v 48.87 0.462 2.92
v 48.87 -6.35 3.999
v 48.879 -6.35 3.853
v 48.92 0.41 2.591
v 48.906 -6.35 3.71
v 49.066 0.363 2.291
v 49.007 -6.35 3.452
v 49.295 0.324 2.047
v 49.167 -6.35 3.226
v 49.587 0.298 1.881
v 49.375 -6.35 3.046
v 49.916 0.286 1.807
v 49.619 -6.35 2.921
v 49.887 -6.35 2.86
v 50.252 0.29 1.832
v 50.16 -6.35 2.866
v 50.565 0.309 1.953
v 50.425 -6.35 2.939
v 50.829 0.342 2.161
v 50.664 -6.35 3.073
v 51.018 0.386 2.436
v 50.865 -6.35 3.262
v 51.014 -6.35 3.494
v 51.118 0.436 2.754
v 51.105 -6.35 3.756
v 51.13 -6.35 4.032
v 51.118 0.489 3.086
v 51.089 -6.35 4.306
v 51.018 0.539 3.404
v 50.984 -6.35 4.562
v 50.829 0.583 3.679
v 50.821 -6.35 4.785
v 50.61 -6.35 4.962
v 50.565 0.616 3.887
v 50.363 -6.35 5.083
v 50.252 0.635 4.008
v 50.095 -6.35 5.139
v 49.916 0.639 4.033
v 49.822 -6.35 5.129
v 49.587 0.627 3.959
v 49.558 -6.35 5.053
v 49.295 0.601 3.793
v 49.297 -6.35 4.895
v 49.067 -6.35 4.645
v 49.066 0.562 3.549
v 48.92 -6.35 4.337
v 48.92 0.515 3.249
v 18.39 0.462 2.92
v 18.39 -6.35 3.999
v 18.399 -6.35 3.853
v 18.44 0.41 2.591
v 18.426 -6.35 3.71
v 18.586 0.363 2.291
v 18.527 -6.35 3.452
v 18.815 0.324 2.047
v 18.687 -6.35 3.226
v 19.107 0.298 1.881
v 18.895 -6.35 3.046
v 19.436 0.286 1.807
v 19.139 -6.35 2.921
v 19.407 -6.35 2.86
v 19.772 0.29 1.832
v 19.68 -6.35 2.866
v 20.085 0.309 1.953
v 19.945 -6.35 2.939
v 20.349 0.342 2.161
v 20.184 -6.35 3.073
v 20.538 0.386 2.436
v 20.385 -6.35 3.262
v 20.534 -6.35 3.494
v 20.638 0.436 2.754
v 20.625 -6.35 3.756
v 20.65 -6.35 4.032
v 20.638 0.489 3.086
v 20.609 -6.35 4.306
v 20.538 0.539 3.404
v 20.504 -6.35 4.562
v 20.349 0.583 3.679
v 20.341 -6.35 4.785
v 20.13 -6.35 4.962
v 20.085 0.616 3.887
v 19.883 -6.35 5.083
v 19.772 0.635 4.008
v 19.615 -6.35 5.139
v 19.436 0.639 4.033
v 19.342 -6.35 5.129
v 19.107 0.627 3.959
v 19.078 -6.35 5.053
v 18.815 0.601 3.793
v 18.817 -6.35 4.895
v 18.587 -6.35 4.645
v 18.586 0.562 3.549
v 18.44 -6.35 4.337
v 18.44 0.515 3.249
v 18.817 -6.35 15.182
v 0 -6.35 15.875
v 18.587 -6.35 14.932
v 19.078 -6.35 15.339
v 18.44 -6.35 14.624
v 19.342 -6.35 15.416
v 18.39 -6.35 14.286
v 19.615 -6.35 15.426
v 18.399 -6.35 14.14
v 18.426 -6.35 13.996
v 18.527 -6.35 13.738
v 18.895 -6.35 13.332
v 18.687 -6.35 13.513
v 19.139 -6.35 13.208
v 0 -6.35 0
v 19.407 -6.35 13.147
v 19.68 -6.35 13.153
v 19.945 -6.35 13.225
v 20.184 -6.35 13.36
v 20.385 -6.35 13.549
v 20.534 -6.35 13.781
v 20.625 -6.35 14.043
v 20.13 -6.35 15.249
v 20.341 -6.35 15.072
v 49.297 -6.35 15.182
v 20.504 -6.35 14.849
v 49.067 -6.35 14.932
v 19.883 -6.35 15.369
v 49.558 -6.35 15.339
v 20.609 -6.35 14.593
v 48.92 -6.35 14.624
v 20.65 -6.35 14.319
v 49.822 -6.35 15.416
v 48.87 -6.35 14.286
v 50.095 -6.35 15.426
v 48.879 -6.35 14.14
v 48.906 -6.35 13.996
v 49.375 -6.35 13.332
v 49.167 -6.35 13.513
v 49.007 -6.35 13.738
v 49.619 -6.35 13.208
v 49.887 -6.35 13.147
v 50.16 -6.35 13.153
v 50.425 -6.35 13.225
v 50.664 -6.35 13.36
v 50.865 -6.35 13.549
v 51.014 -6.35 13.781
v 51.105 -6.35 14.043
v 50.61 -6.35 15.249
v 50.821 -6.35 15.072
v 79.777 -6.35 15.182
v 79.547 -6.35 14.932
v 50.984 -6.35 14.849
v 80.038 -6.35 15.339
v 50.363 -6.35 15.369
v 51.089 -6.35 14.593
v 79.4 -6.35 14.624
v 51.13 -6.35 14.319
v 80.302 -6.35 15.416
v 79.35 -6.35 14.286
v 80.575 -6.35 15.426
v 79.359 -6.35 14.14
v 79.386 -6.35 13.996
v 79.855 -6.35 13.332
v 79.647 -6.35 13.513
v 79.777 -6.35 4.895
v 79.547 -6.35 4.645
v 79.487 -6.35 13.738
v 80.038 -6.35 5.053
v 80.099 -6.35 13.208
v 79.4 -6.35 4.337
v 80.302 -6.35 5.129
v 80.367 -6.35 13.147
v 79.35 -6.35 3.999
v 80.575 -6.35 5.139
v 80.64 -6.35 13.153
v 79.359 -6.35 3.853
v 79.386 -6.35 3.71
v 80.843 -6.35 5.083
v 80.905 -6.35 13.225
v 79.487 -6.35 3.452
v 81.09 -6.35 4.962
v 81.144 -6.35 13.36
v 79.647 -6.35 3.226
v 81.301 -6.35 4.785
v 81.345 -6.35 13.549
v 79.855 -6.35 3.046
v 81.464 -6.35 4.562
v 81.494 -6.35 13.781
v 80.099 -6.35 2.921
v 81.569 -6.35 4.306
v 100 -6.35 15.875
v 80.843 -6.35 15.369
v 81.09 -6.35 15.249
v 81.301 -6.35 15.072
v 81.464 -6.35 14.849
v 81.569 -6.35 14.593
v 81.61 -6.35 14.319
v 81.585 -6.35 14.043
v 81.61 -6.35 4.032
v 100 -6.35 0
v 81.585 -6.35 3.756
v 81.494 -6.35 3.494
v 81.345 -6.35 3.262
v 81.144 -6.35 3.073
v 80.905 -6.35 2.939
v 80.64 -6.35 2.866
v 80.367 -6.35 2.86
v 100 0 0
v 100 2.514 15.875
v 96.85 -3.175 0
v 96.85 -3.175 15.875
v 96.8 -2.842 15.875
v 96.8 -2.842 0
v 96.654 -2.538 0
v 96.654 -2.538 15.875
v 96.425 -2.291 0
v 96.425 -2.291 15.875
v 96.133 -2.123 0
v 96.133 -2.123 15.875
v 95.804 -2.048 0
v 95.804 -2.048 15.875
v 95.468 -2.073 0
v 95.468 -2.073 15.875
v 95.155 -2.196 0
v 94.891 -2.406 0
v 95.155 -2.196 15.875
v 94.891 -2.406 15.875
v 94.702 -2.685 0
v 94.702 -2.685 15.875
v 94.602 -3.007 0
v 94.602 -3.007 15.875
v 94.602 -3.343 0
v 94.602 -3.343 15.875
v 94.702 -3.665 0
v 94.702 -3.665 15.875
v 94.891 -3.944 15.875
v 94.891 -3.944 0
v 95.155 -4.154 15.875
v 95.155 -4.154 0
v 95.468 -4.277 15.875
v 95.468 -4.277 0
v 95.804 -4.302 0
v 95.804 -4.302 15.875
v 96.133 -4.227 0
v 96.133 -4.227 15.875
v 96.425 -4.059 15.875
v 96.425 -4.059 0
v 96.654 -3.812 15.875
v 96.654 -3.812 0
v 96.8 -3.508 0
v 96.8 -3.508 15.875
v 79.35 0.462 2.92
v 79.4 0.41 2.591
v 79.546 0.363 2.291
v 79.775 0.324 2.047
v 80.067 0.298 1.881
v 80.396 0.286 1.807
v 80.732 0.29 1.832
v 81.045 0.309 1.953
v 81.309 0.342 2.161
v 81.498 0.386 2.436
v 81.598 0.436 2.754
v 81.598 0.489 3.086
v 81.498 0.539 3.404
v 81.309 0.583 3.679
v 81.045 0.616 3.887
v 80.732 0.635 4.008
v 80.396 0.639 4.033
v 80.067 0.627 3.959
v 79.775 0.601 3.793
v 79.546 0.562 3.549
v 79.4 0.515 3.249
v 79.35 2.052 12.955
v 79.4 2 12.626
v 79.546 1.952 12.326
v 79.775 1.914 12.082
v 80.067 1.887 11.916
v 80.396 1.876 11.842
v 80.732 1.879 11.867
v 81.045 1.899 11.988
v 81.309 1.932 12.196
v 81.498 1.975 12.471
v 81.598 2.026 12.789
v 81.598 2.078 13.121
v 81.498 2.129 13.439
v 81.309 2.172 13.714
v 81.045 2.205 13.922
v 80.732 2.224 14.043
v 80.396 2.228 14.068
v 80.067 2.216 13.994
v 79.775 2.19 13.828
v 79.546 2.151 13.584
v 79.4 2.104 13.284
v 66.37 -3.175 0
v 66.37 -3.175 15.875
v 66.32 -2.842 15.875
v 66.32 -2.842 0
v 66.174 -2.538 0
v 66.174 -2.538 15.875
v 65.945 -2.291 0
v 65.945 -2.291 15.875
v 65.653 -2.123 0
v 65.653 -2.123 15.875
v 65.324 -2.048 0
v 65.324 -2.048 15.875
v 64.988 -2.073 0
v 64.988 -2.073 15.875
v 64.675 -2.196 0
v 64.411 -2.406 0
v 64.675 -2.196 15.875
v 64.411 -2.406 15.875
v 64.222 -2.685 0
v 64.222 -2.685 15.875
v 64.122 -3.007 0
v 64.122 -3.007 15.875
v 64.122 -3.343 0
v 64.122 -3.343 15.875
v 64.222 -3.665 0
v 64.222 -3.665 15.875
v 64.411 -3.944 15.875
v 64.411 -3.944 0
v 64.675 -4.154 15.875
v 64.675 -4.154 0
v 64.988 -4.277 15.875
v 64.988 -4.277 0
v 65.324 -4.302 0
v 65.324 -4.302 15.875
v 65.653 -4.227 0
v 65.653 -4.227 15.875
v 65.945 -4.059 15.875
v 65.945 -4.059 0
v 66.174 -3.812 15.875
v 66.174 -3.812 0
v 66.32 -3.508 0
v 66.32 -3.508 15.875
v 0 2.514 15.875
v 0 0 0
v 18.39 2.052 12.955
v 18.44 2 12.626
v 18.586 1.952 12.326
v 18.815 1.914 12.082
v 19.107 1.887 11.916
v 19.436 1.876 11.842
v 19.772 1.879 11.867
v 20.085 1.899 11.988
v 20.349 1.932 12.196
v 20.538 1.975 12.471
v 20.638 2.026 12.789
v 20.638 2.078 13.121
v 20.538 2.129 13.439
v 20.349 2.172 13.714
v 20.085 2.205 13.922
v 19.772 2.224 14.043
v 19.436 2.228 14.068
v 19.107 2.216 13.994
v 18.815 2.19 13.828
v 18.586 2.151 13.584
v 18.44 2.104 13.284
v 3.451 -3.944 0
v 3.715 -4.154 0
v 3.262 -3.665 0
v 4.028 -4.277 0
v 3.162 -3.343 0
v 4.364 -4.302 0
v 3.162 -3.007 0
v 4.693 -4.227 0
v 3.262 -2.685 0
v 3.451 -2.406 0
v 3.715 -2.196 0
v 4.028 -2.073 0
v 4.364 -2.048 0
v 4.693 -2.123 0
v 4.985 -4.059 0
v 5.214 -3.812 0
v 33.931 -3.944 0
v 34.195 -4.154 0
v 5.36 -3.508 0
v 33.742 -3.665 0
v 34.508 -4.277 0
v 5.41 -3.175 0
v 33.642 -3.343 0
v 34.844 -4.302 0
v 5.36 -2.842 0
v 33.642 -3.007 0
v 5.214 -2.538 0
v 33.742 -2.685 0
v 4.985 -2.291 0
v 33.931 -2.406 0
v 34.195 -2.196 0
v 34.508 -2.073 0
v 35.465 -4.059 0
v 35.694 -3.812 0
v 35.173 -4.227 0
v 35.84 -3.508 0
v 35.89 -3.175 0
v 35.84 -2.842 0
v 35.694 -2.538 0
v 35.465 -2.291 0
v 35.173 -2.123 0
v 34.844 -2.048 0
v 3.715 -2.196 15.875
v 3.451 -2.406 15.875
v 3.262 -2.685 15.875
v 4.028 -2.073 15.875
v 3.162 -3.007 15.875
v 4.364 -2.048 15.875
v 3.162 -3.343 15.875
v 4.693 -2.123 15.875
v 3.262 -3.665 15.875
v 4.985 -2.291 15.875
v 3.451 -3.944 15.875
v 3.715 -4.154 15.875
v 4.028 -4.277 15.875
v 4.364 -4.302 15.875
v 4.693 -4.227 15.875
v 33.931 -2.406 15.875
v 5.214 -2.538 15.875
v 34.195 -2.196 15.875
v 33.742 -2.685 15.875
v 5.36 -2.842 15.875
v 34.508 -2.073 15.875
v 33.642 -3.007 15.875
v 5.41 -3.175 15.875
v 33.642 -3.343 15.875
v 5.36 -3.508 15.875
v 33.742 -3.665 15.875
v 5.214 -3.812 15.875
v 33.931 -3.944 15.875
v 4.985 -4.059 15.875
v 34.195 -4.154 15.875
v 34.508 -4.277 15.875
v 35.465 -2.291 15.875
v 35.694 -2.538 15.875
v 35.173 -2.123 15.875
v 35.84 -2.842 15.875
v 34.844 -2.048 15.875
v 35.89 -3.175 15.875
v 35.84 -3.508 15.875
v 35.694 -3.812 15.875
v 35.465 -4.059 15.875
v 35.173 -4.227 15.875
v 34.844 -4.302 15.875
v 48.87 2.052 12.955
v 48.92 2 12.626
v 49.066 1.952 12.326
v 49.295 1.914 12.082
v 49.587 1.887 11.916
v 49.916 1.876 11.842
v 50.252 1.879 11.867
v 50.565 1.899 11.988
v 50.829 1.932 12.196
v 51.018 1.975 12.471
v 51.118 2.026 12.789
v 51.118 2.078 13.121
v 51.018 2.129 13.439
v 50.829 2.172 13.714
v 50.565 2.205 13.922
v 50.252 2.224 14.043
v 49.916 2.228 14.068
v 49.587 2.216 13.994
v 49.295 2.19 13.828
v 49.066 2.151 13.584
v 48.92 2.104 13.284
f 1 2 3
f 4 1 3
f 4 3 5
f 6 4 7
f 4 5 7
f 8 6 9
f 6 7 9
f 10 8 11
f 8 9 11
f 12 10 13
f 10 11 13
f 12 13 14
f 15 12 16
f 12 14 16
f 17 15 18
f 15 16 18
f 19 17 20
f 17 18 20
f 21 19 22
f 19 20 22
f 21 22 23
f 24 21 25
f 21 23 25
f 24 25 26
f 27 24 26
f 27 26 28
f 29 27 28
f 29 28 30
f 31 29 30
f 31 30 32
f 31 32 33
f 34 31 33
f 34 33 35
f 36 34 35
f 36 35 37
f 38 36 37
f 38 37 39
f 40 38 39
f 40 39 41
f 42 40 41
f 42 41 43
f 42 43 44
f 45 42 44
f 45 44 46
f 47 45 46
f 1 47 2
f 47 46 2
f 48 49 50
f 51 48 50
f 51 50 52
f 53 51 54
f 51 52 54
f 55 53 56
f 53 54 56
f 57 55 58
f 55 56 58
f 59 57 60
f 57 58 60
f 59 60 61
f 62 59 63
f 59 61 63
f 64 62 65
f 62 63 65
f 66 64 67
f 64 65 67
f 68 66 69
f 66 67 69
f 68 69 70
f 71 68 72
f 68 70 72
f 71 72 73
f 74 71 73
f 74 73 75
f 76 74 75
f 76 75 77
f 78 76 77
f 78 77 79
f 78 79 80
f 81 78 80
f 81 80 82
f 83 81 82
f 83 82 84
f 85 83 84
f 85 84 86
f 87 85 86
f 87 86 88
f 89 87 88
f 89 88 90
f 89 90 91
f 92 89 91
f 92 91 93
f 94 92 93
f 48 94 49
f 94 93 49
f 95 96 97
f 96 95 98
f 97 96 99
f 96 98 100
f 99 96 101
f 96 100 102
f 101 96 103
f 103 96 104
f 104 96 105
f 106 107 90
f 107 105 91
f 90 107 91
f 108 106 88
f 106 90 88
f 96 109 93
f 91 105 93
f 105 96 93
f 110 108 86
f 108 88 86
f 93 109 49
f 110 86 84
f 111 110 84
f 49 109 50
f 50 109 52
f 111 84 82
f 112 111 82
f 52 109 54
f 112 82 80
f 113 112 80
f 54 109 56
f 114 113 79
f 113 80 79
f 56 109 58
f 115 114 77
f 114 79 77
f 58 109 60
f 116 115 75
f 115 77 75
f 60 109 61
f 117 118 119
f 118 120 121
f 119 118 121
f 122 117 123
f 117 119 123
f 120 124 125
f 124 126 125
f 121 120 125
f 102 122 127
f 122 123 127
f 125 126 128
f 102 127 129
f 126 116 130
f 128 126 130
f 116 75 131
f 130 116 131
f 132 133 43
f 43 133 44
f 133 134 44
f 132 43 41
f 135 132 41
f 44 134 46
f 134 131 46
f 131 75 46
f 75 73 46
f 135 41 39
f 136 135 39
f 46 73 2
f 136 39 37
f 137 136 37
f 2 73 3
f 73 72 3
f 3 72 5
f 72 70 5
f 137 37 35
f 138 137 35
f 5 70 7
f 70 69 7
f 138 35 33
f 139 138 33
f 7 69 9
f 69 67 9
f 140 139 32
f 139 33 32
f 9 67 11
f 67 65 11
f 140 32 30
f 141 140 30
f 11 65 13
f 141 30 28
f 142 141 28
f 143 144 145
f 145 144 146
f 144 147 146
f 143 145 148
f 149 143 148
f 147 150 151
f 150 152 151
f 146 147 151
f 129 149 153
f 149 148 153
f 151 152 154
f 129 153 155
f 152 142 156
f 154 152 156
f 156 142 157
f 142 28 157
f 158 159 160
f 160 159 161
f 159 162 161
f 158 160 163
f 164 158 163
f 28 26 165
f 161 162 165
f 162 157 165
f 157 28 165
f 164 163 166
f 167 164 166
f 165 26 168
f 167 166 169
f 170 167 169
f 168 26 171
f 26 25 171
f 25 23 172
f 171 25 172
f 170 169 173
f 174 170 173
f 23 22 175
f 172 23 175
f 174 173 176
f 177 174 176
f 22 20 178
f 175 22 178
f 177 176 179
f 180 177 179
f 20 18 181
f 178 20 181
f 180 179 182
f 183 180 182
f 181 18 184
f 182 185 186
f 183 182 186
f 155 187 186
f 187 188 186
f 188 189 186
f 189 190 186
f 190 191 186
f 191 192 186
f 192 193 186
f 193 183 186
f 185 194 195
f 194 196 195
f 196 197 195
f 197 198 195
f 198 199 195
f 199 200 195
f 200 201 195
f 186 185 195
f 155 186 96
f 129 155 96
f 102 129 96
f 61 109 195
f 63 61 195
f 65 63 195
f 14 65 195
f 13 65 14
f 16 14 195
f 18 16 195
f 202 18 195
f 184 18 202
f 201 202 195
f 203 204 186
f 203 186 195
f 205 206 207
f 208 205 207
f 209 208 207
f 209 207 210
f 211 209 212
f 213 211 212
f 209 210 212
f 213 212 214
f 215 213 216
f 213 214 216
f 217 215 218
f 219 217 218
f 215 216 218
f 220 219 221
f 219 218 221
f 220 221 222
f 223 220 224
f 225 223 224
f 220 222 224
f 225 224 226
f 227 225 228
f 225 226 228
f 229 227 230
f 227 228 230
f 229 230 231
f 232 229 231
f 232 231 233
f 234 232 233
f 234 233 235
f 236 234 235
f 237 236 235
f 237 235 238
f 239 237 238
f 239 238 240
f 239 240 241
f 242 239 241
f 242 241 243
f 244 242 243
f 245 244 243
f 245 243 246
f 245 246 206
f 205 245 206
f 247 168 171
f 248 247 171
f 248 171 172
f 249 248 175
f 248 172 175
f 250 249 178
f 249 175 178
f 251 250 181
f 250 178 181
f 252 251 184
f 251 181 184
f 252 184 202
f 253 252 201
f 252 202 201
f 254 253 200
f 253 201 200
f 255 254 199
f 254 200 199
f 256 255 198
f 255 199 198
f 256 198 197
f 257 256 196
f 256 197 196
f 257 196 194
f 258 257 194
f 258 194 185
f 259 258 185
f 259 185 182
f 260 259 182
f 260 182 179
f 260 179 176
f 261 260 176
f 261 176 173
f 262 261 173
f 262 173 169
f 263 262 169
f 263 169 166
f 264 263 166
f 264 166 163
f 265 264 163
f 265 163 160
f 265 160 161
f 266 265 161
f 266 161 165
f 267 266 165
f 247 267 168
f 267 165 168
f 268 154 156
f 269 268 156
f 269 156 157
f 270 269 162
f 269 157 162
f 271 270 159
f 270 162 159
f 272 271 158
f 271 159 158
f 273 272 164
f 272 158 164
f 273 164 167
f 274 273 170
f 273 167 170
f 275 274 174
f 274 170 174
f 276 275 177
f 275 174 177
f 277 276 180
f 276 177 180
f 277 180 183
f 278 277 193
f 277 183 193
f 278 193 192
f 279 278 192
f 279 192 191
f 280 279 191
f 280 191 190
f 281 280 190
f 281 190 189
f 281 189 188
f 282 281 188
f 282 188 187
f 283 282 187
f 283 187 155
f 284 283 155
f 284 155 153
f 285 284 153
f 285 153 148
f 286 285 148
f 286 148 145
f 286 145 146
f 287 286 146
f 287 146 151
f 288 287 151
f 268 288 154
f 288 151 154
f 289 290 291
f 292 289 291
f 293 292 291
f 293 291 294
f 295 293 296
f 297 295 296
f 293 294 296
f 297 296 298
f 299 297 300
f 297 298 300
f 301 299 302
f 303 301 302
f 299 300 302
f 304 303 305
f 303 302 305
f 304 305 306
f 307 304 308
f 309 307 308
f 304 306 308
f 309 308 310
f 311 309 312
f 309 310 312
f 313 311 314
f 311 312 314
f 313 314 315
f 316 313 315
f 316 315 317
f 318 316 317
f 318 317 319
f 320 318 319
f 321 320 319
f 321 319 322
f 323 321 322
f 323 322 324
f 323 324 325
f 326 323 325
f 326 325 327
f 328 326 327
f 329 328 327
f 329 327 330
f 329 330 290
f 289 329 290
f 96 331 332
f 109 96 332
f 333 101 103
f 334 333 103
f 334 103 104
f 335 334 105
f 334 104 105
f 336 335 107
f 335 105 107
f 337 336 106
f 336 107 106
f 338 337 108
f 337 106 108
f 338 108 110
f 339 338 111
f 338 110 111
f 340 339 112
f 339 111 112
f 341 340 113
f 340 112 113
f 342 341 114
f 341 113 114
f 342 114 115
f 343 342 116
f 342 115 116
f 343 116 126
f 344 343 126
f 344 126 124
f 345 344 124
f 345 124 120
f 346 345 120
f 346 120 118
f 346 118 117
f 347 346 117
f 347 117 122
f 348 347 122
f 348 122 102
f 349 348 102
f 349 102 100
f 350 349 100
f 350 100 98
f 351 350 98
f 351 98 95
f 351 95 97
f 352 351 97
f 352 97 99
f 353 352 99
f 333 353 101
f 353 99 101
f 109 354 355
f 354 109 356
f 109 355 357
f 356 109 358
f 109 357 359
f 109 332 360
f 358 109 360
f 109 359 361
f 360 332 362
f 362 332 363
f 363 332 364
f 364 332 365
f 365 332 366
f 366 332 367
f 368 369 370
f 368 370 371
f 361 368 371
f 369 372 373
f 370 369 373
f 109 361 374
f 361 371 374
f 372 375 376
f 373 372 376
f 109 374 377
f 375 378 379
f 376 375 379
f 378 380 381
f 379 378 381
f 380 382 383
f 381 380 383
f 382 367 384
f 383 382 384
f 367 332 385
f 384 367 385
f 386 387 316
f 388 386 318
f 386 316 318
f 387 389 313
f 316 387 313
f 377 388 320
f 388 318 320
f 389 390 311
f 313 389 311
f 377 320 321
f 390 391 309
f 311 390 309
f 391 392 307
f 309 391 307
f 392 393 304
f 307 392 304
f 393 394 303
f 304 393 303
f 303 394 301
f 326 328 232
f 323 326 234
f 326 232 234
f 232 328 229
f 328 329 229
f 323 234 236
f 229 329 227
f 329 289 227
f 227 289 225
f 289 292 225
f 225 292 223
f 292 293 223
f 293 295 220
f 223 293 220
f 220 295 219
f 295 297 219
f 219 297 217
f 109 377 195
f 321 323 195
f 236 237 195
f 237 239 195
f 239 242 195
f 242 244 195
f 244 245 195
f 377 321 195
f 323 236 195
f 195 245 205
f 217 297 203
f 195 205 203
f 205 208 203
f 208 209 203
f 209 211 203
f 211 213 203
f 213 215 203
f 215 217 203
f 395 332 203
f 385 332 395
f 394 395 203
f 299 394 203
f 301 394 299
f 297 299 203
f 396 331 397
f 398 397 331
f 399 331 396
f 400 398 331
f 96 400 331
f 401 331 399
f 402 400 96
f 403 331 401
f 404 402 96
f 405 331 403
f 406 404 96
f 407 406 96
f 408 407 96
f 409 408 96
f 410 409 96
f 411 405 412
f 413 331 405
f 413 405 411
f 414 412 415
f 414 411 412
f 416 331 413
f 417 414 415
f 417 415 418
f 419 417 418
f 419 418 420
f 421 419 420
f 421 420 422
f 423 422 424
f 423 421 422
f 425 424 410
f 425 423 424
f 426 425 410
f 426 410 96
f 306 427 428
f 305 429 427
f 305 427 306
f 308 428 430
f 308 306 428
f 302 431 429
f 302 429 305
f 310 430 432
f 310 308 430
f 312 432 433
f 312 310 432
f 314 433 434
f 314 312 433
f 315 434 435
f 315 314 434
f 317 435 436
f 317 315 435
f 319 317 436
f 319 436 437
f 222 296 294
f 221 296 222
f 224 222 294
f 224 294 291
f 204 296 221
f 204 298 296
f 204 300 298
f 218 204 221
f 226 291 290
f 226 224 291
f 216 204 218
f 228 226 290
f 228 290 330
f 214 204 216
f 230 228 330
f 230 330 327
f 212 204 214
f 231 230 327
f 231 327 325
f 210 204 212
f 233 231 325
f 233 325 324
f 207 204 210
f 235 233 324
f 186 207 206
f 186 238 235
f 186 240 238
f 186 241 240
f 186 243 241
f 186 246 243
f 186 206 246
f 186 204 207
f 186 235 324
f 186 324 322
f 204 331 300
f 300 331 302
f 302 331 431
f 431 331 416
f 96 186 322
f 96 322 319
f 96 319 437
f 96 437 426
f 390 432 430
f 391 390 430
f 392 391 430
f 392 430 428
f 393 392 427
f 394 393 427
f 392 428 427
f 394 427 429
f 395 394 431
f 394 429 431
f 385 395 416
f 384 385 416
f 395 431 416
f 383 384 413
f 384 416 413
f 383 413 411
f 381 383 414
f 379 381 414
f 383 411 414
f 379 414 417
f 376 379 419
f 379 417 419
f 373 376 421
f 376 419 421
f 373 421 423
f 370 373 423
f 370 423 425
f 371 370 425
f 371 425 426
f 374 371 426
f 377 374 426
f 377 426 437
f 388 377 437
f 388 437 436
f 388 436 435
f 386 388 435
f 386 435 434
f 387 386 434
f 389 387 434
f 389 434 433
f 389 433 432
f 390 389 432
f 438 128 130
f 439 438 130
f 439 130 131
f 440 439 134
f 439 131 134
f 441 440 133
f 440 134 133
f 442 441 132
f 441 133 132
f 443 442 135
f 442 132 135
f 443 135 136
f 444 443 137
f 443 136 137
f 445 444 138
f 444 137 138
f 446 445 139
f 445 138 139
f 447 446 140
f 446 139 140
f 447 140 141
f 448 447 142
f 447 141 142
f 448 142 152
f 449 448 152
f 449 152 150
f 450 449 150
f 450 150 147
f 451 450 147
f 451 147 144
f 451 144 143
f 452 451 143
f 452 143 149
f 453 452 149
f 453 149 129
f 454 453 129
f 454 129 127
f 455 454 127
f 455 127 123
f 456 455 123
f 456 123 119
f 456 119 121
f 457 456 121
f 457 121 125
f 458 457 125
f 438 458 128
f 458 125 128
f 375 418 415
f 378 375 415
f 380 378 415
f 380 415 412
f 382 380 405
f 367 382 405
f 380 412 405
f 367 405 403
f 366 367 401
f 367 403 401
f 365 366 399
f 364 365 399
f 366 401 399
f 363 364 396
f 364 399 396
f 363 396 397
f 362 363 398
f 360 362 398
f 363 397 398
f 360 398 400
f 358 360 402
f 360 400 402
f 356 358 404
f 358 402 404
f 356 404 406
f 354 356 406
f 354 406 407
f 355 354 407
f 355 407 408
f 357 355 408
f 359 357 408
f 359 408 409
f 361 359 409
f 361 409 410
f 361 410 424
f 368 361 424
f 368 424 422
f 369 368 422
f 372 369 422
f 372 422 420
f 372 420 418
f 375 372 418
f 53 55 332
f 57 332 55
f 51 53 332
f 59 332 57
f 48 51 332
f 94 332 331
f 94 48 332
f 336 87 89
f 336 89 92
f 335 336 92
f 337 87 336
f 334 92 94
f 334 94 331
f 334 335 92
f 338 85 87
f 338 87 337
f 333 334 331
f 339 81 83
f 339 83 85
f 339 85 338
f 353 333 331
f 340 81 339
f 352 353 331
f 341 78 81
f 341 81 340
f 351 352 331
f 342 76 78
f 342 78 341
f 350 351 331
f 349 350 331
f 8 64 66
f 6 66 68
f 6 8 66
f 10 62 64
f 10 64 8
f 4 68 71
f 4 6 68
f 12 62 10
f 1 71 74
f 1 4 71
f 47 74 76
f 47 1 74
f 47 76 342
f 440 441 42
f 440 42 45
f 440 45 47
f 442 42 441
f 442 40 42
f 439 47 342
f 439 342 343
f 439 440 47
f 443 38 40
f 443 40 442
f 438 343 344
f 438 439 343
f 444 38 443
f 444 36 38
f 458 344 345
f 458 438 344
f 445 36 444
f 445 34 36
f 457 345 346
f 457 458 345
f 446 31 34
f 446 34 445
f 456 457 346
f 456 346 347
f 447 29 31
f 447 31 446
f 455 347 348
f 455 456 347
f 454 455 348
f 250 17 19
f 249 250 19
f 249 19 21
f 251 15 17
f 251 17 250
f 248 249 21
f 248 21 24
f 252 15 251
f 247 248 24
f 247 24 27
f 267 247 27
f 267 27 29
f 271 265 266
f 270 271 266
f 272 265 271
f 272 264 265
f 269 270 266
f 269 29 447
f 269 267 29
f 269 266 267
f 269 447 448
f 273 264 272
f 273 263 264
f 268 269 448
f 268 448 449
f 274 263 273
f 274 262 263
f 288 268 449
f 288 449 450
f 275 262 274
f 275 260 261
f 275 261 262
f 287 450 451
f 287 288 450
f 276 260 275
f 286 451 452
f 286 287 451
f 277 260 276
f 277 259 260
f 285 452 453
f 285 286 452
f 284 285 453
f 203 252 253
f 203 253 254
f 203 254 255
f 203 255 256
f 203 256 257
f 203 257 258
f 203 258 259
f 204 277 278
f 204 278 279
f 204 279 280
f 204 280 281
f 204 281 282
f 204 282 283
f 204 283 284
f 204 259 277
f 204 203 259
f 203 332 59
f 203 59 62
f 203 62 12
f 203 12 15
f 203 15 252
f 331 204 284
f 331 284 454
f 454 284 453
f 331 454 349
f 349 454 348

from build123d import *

# Parameters (mm, degrees)
SKETCH1_W             = 100
SKETCH1_H             = 6.35
BOSS_EXTRUDE1_DEPTH   = 15.875
F_4_40_TAPPED_HOLE1_D = 2.2606
BOSS_EXTRUDE2_DEPTH   = 100
F_4_40_TAPPED_HOLE2_D = 2.2606


with BuildPart() as part:
    # Sketch1 → Boss-Extrude1 (new body)
    with BuildSketch(Plane.XY):
        with Locations((50, -3.175)):
            Rectangle(SKETCH1_W, SKETCH1_H)
    extrude(amount=BOSS_EXTRUDE1_DEPTH)

    # #4-40 Tapped Hole1 (through all)
    with Locations(Plane(origin=(0, 0, 0), x_dir=(-1, 0, 0), z_dir=(0, 0, -1))):
        with Locations((-95.72, -3.175), (-4.28, -3.175), (-34.76, -3.175), (-65.24, -3.175)):
            Hole(F_4_40_TAPPED_HOLE1_D / 2)

    # Sketch4 → Boss-Extrude2 (add, through all)
    with BuildSketch(Plane(origin=(100, 0, 0), x_dir=(0, 0, -1), z_dir=(1, 0, 0))):
        Polygon((0, 0), (-15.875, 2.51435299), (-15.875, 0), align=None)
    extrude(amount=-BOSS_EXTRUDE2_DEPTH)

    # #4-40 Tapped Hole2 (through all)
    with Locations(Plane(origin=(0, 0, 0), x_dir=(1, 0, 0), z_dir=(0, 0.987688341, -0.156434465))):
        with Locations((80.48, -13.116441936), (80.48, -2.956441936), (50, -13.116441936), (50, -2.956441936), (19.52, -13.116441936), (19.52, -2.956441936)):
            Hole(F_4_40_TAPPED_HOLE2_D / 2)


solid = part.part
